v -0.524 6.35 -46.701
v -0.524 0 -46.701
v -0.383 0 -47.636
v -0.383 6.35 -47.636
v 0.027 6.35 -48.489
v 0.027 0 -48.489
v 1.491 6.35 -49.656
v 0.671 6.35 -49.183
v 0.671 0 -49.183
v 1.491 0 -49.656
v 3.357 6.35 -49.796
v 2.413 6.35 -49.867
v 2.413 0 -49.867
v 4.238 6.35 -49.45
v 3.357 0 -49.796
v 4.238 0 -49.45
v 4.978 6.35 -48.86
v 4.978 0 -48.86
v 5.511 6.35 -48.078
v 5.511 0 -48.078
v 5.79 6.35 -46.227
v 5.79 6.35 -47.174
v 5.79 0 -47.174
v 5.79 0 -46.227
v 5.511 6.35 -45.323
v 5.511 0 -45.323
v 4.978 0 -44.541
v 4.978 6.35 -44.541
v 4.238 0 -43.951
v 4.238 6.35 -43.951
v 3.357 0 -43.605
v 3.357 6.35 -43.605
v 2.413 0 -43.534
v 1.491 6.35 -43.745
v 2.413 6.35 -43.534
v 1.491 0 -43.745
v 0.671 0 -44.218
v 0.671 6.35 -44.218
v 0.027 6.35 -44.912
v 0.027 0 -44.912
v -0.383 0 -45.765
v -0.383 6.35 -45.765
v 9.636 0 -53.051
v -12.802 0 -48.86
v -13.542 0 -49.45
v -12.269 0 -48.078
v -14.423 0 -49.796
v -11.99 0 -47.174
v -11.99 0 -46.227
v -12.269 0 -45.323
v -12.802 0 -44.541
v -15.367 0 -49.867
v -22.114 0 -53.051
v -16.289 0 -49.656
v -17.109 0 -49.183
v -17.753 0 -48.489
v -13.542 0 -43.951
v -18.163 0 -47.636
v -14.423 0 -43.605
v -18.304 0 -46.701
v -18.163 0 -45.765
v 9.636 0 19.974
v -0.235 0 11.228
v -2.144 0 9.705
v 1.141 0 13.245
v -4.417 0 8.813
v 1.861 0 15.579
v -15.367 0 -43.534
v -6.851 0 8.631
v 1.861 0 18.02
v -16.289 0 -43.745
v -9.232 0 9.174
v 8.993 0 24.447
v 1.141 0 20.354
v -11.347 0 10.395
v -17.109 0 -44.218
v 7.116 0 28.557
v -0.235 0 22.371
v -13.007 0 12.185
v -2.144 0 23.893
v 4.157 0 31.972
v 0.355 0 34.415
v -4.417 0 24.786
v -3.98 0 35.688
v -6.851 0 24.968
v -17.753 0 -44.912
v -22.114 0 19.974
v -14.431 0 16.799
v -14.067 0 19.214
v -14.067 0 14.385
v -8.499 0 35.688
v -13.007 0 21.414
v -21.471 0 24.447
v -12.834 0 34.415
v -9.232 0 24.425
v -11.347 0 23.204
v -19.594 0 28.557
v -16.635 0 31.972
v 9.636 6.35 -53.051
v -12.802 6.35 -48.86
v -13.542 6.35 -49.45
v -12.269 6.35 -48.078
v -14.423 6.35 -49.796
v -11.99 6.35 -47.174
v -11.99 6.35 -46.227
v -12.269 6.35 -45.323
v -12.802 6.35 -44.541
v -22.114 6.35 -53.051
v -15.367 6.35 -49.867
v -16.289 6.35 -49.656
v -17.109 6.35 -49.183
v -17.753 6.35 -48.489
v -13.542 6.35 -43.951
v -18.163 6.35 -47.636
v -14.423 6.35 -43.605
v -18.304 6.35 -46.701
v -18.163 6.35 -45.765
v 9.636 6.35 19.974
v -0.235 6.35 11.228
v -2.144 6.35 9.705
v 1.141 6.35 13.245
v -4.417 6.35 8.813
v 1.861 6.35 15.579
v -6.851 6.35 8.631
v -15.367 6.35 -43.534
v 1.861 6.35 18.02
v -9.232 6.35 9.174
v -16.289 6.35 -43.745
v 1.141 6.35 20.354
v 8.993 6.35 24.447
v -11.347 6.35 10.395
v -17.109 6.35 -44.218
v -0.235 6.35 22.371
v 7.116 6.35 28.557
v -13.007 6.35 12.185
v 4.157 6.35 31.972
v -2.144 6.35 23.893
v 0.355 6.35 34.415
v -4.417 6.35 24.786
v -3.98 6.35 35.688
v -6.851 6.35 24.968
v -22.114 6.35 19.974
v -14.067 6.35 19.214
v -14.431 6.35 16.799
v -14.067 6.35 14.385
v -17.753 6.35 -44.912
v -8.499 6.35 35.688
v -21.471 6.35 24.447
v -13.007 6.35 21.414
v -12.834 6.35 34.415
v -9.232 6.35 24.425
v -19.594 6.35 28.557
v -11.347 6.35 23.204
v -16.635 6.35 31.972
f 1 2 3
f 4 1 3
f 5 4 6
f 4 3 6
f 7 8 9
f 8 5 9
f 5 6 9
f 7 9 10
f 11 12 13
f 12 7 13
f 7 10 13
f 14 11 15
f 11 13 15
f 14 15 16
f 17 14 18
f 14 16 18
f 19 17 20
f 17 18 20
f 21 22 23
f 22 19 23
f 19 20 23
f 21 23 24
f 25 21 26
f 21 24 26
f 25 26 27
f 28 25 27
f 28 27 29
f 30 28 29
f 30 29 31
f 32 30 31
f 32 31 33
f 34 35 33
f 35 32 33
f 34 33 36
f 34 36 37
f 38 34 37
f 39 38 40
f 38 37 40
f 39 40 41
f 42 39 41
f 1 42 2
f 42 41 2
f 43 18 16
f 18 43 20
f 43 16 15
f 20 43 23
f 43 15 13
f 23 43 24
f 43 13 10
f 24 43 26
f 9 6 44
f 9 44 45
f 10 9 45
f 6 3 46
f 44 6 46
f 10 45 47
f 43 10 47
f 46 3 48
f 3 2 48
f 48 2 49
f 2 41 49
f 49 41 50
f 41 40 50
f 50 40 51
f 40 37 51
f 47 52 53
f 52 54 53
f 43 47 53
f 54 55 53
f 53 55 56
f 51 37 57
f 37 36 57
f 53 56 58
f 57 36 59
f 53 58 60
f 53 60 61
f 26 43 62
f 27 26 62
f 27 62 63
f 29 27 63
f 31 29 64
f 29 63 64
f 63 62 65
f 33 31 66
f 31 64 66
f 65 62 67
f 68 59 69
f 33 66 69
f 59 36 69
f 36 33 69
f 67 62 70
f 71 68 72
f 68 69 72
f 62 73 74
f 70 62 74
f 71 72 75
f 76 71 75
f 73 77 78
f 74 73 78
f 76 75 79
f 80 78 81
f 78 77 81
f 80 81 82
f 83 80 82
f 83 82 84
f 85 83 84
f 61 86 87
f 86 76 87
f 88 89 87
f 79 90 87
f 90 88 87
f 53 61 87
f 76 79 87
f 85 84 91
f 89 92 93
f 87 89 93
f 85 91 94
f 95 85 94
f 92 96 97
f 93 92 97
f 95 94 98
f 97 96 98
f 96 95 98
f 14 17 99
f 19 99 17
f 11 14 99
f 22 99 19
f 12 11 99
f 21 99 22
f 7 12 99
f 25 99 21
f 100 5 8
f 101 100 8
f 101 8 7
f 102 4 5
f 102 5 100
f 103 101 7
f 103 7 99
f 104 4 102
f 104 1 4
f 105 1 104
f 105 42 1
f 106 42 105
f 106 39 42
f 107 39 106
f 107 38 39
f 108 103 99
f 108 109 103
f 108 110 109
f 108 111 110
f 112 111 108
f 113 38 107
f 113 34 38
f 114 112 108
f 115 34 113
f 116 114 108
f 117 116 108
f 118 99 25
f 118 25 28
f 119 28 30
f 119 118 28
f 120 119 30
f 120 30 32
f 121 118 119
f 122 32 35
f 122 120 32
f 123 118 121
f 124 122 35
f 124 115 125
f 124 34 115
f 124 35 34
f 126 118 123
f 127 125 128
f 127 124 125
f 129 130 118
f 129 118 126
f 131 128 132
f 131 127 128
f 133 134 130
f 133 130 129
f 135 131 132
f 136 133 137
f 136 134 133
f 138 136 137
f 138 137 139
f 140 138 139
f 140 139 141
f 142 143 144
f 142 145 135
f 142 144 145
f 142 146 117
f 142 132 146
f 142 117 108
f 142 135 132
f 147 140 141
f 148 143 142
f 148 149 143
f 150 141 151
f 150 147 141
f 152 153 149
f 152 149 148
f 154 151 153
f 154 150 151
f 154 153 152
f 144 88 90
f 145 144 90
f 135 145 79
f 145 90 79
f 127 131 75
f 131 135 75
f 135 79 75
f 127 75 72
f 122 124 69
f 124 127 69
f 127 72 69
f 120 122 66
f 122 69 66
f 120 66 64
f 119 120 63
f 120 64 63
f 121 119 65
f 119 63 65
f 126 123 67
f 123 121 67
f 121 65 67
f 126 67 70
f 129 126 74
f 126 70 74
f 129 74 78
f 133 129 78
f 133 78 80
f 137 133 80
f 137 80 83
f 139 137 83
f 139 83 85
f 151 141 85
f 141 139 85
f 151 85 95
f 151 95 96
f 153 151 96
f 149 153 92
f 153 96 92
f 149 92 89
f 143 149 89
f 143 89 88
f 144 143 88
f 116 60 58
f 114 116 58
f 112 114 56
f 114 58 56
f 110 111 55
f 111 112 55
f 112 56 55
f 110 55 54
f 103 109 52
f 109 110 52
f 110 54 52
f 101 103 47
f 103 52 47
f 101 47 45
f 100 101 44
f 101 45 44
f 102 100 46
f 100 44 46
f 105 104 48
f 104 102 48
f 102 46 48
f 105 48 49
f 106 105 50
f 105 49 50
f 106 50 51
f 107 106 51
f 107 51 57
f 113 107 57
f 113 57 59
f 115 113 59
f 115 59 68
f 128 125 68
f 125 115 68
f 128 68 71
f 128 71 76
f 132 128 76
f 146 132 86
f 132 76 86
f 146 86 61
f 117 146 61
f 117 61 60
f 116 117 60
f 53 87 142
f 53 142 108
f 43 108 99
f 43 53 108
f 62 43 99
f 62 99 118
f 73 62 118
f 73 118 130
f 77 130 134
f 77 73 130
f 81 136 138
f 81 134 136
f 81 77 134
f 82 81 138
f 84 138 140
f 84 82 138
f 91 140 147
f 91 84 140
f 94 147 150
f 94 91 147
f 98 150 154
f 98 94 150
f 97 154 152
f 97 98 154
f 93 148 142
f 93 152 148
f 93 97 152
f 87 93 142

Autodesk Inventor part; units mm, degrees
ref_plane "YZ Plane" through (0, 0, 0) normal (1, 0, 0) x (0, 1, 0)
ref_plane "XZ Plane" through (0, 0, 0) normal (0, 1, 0) x (-1, 0, 0)
ref_plane "XY Plane" through (0, 0, 0) normal (0, 0, 1) x (1, 0, 0)
sketch "Sketch1" plane through (0, 0, 0) normal (0, 1, 0) x (-1, 0, 0)
  line L0 (22.1143, 19.9744) -> (22.1143, -53.0506)
  line L1 (22.1143, -53.0506) -> (-9.6357, -53.0506)
  line L2 (-9.6357, -53.0506) -> (-9.6357, 19.9744)
  arc A0 (22.1143, 19.9744) -> (-9.6357, 19.9744) centre (6.2393, 19.9744) ccw
  circle A1 centre (15.1293, -46.7006) radius 3.175
  circle A2 centre (-2.6507, -46.7006) radius 3.175
  circle A3 centre (6.2393, 16.7994) radius 8.1915
  point P0 (0, 0)
  point P1 (6.2393, 35.8494)
  dimension "d0" = 31.75
  dimension "d1" = 88.9
  dimension "d3" = 6.35
  dimension "d4" = 6.35
  dimension "d5" = 17.78
  dimension "d6" = 6.35
  dimension "d7" = 6.35
  dimension "d10" = 6.985
  dimension "d11" = 6.985
  dimension "d12" = 16.383
  dimension "d14" = 3.175
  dimension "d15" = 15.875
  dimension "d16" = 15.875
extrude "Extrusion2" add sketch "Sketch1" along normal blind 6.35
equation "\"d7\" = d6"
equation "\"d10\" = d11"
equation "\"d15\" = d16"
properties part number "self aligning bearing holder"
